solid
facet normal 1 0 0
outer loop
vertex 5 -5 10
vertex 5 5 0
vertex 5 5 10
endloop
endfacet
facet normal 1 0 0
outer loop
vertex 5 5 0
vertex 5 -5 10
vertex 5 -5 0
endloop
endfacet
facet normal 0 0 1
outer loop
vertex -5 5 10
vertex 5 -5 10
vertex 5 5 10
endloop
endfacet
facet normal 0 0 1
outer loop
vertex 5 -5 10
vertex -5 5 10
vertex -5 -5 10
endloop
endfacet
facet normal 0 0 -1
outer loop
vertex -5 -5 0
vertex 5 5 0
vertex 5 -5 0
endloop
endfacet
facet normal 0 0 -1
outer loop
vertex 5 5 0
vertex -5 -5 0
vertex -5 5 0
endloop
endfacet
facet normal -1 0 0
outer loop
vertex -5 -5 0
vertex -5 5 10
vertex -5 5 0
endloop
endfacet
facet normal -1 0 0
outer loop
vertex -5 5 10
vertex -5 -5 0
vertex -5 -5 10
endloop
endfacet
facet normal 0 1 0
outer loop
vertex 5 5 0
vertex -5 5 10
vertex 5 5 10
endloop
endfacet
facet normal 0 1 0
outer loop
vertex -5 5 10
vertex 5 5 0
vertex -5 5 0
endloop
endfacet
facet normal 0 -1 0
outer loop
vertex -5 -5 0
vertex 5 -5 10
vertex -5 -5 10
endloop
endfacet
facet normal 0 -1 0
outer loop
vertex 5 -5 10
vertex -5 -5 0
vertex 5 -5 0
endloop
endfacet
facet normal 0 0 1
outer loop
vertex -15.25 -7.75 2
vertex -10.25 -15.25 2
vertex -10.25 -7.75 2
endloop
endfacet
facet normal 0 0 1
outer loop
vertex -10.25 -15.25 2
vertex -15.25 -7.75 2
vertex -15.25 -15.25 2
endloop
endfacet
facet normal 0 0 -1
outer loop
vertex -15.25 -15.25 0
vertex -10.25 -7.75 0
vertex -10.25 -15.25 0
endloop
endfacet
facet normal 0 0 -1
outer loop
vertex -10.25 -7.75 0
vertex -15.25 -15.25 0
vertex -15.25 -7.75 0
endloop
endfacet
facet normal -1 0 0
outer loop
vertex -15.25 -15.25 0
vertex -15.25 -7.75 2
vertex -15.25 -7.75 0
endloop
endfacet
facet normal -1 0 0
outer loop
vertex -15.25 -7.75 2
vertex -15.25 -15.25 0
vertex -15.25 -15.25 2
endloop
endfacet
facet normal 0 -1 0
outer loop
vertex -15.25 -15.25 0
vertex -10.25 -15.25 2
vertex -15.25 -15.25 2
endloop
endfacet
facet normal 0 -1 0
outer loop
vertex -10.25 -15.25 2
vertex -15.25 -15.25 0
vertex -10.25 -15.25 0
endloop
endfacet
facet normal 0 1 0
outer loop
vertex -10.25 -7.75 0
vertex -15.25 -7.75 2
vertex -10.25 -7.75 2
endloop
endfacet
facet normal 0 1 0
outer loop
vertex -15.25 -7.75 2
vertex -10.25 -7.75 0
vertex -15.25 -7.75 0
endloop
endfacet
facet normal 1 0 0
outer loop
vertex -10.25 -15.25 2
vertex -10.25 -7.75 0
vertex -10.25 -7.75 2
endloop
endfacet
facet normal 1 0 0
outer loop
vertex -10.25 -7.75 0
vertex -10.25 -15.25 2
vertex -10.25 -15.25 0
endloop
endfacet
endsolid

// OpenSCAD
translate([0, 0, 5]) color([0,1,0,0.9]) cube([10, 10, 10], center=true);
translate([-15.0, -15.0, 1]) color([1,0,0]) cube([0.5, 0.5, 2], center=true);
translate([-15.0, -14.5, 1]) color([1,0,0]) cube([0.5, 0.5, 2], center=true);
translate([-15.0, -14.0, 1]) color([1,0,0]) cube([0.5, 0.5, 2], center=true);
translate([-15.0, -13.5, 1]) color([1,0,0]) cube([0.5, 0.5, 2], center=true);
translate([-15.0, -13.0, 1]) color([1,0,0]) cube([0.5, 0.5, 2], center=true);
translate([-15.0, -12.5, 1]) color([1,0,0]) cube([0.5, 0.5, 2], center=true);
translate([-15.0, -12.0, 1]) color([1,0,0]) cube([0.5, 0.5, 2], center=true);
translate([-15.0, -11.5, 1]) color([1,0,0]) cube([0.5, 0.5, 2], center=true);
translate([-15.0, -11.0, 1]) color([1,0,0]) cube([0.5, 0.5, 2], center=true);
translate([-15.0, -10.5, 1]) color([1,0,0]) cube([0.5, 0.5, 2], center=true);
translate([-15.0, -10.0, 1]) color([1,0,0]) cube([0.5, 0.5, 2], center=true);
translate([-15.0, -9.5, 1]) color([1,0,0]) cube([0.5, 0.5, 2], center=true);
translate([-15.0, -9.0, 1]) color([1,0,0]) cube([0.5, 0.5, 2], center=true);
translate([-15.0, -8.5, 1]) color([1,0,0]) cube([0.5, 0.5, 2], center=true);
translate([-15.0, -8.0, 1]) color([1,0,0]) cube([0.5, 0.5, 2], center=true);
translate([-14.5, -15.0, 1]) color([1,0,0]) cube([0.5, 0.5, 2], center=true);
translate([-14.5, -14.5, 1]) color([1,0,0]) cube([0.5, 0.5, 2], center=true);
translate([-14.5, -14.0, 1]) color([1,0,0]) cube([0.5, 0.5, 2], center=true);
translate([-14.5, -13.5, 1]) color([1,0,0]) cube([0.5, 0.5, 2], center=true);
translate([-14.5, -13.0, 1]) color([1,0,0]) cube([0.5, 0.5, 2], center=true);
translate([-14.5, -12.5, 1]) color([1,0,0]) cube([0.5, 0.5, 2], center=true);
translate([-14.5, -12.0, 1]) color([1,0,0]) cube([0.5, 0.5, 2], center=true);
translate([-14.5, -11.5, 1]) color([1,0,0]) cube([0.5, 0.5, 2], center=true);
translate([-14.5, -11.0, 1]) color([1,0,0]) cube([0.5, 0.5, 2], center=true);
translate([-14.5, -10.5, 1]) color([1,0,0]) cube([0.5, 0.5, 2], center=true);
translate([-14.5, -10.0, 1]) color([1,0,0]) cube([0.5, 0.5, 2], center=true);
translate([-14.5, -9.5, 1]) color([1,0,0]) cube([0.5, 0.5, 2], center=true);
translate([-14.5, -9.0, 1]) color([1,0,0]) cube([0.5, 0.5, 2], center=true);
translate([-14.5, -8.5, 1]) color([1,0,0]) cube([0.5, 0.5, 2], center=true);
translate([-14.5, -8.0, 1]) color([1,0,0]) cube([0.5, 0.5, 2], center=true);
translate([-14.0, -15.0, 1]) color([1,0,0]) cube([0.5, 0.5, 2], center=true);
translate([-14.0, -14.5, 1]) color([1,0,0]) cube([0.5, 0.5, 2], center=true);
translate([-14.0, -14.0, 1]) color([1,0,0]) cube([0.5, 0.5, 2], center=true);
translate([-14.0, -13.5, 1]) color([1,0,0]) cube([0.5, 0.5, 2], center=true);
translate([-14.0, -13.0, 1]) color([1,0,0]) cube([0.5, 0.5, 2], center=true);
translate([-14.0, -12.5, 1]) color([1,0,0]) cube([0.5, 0.5, 2], center=true);
translate([-14.0, -12.0, 1]) color([1,0,0]) cube([0.5, 0.5, 2], center=true);
translate([-14.0, -11.5, 1]) color([1,0,0]) cube([0.5, 0.5, 2], center=true);
translate([-14.0, -11.0, 1]) color([1,0,0]) cube([0.5, 0.5, 2], center=true);
translate([-14.0, -10.5, 1]) color([1,0,0]) cube([0.5, 0.5, 2], center=true);
translate([-14.0, -10.0, 1]) color([1,0,0]) cube([0.5, 0.5, 2], center=true);
translate([-14.0, -9.5, 1]) color([1,0,0]) cube([0.5, 0.5, 2], center=true);
translate([-14.0, -9.0, 1]) color([1,0,0]) cube([0.5, 0.5, 2], center=true);
translate([-14.0, -8.5, 1]) color([1,0,0]) cube([0.5, 0.5, 2], center=true);
translate([-14.0, -8.0, 1]) color([1,0,0]) cube([0.5, 0.5, 2], center=true);
translate([-13.5, -15.0, 1]) color([1,0,0]) cube([0.5, 0.5, 2], center=true);
translate([-13.5, -14.5, 1]) color([1,0,0]) cube([0.5, 0.5, 2], center=true);
translate([-13.5, -14.0, 1]) color([1,0,0]) cube([0.5, 0.5, 2], center=true);
translate([-13.5, -13.5, 1]) color([1,0,0]) cube([0.5, 0.5, 2], center=true);
translate([-13.5, -13.0, 1]) color([1,0,0]) cube([0.5, 0.5, 2], center=true);
translate([-13.5, -12.5, 1]) color([1,0,0]) cube([0.5, 0.5, 2], center=true);
translate([-13.5, -12.0, 1]) color([1,0,0]) cube([0.5, 0.5, 2], center=true);
translate([-13.5, -11.5, 1]) color([1,0,0]) cube([0.5, 0.5, 2], center=true);
translate([-13.5, -11.0, 1]) color([1,0,0]) cube([0.5, 0.5, 2], center=true);
translate([-13.5, -10.5, 1]) color([1,0,0]) cube([0.5, 0.5, 2], center=true);
translate([-13.5, -10.0, 1]) color([1,0,0]) cube([0.5, 0.5, 2], center=true);
translate([-13.5, -9.5, 1]) color([1,0,0]) cube([0.5, 0.5, 2], center=true);
translate([-13.5, -9.0, 1]) color([1,0,0]) cube([0.5, 0.5, 2], center=true);
translate([-13.5, -8.5, 1]) color([1,0,0]) cube([0.5, 0.5, 2], center=true);
translate([-13.5, -8.0, 1]) color([1,0,0]) cube([0.5, 0.5, 2], center=true);
translate([-13.0, -15.0, 1]) color([1,0,0]) cube([0.5, 0.5, 2], center=true);
translate([-13.0, -14.5, 1]) color([1,0,0]) cube([0.5, 0.5, 2], center=true);
translate([-13.0, -14.0, 1]) color([1,0,0]) cube([0.5, 0.5, 2], center=true);
translate([-13.0, -13.5, 1]) color([1,0,0]) cube([0.5, 0.5, 2], center=true);
translate([-13.0, -13.0, 1]) color([1,0,0]) cube([0.5, 0.5, 2], center=true);
translate([-13.0, -12.5, 1]) color([1,0,0]) cube([0.5, 0.5, 2], center=true);
translate([-13.0, -12.0, 1]) color([1,0,0]) cube([0.5, 0.5, 2], center=true);
translate([-13.0, -11.5, 1]) color([1,0,0]) cube([0.5, 0.5, 2], center=true);
translate([-13.0, -11.0, 1]) color([1,0,0]) cube([0.5, 0.5, 2], center=true);
translate([-13.0, -10.5, 1]) color([1,0,0]) cube([0.5, 0.5, 2], center=true);
translate([-13.0, -10.0, 1]) color([1,0,0]) cube([0.5, 0.5, 2], center=true);
translate([-13.0, -9.5, 1]) color([1,0,0]) cube([0.5, 0.5, 2], center=true);
translate([-13.0, -9.0, 1]) color([1,0,0]) cube([0.5, 0.5, 2], center=true);
translate([-13.0, -8.5, 1]) color([1,0,0]) cube([0.5, 0.5, 2], center=true);
translate([-13.0, -8.0, 1]) color([1,0,0]) cube([0.5, 0.5, 2], center=true);
translate([-12.5, -15.0, 1]) color([1,0,0]) cube([0.5, 0.5, 2], center=true);
translate([-12.5, -14.5, 1]) color([1,0,0]) cube([0.5, 0.5, 2], center=true);
translate([-12.5, -14.0, 1]) color([1,0,0]) cube([0.5, 0.5, 2], center=true);
translate([-12.5, -13.5, 1]) color([1,0,0]) cube([0.5, 0.5, 2], center=true);
translate([-12.5, -13.0, 1]) color([1,0,0]) cube([0.5, 0.5, 2], center=true);
translate([-12.5, -12.5, 1]) color([1,0,0]) cube([0.5, 0.5, 2], center=true);
translate([-12.5, -12.0, 1]) color([1,0,0]) cube([0.5, 0.5, 2], center=true);
translate([-12.5, -11.5, 1]) color([1,0,0]) cube([0.5, 0.5, 2], center=true);
translate([-12.5, -11.0, 1]) color([1,0,0]) cube([0.5, 0.5, 2], center=true);
translate([-12.5, -10.5, 1]) color([1,0,0]) cube([0.5, 0.5, 2], center=true);
translate([-12.5, -10.0, 1]) color([1,0,0]) cube([0.5, 0.5, 2], center=true);
translate([-12.5, -9.5, 1]) color([1,0,0]) cube([0.5, 0.5, 2], center=true);
translate([-12.5, -9.0, 1]) color([1,0,0]) cube([0.5, 0.5, 2], center=true);
translate([-12.5, -8.5, 1]) color([1,0,0]) cube([0.5, 0.5, 2], center=true);
translate([-12.5, -8.0, 1]) color([1,0,0]) cube([0.5, 0.5, 2], center=true);
translate([-12.0, -15.0, 1]) color([1,0,0]) cube([0.5, 0.5, 2], center=true);
translate([-12.0, -14.5, 1]) color([1,0,0]) cube([0.5, 0.5, 2], center=true);
translate([-12.0, -14.0, 1]) color([1,0,0]) cube([0.5, 0.5, 2], center=true);
translate([-12.0, -13.5, 1]) color([1,0,0]) cube([0.5, 0.5, 2], center=true);
translate([-12.0, -13.0, 1]) color([1,0,0]) cube([0.5, 0.5, 2], center=true);
translate([-12.0, -12.5, 1]) color([1,0,0]) cube([0.5, 0.5, 2], center=true);
translate([-12.0, -12.0, 1]) color([1,0,0]) cube([0.5, 0.5, 2], center=true);
translate([-12.0, -11.5, 1]) color([1,0,0]) cube([0.5, 0.5, 2], center=true);
translate([-12.0, -11.0, 1]) color([1,0,0]) cube([0.5, 0.5, 2], center=true);
translate([-12.0, -10.5, 1]) color([1,0,0]) cube([0.5, 0.5, 2], center=true);
translate([-12.0, -10.0, 1]) color([1,0,0]) cube([0.5, 0.5, 2], center=true);
translate([-12.0, -9.5, 1]) color([1,0,0]) cube([0.5, 0.5, 2], center=true);
translate([-12.0, -9.0, 1]) color([1,0,0]) cube([0.5, 0.5, 2], center=true);
translate([-12.0, -8.5, 1]) color([1,0,0]) cube([0.5, 0.5, 2], center=true);
translate([-12.0, -8.0, 1]) color([1,0,0]) cube([0.5, 0.5, 2], center=true);
translate([-11.5, -15.0, 1]) color([1,0,0]) cube([0.5, 0.5, 2], center=true);
translate([-11.5, -14.5, 1]) color([1,0,0]) cube([0.5, 0.5, 2], center=true);
translate([-11.5, -14.0, 1]) color([1,0,0]) cube([0.5, 0.5, 2], center=true);
translate([-11.5, -13.5, 1]) color([1,0,0]) cube([0.5, 0.5, 2], center=true);
translate([-11.5, -13.0, 1]) color([1,0,0]) cube([0.5, 0.5, 2], center=true);
translate([-11.5, -12.5, 1]) color([1,0,0]) cube([0.5, 0.5, 2], center=true);
translate([-11.5, -12.0, 1]) color([1,0,0]) cube([0.5, 0.5, 2], center=true);
translate([-11.5, -11.5, 1]) color([1,0,0]) cube([0.5, 0.5, 2], center=true);
translate([-11.5, -11.0, 1]) color([1,0,0]) cube([0.5, 0.5, 2], center=true);
translate([-11.5, -10.5, 1]) color([1,0,0]) cube([0.5, 0.5, 2], center=true);
translate([-11.5, -10.0, 1]) color([1,0,0]) cube([0.5, 0.5, 2], center=true);
translate([-11.5, -9.5, 1]) color([1,0,0]) cube([0.5, 0.5, 2], center=true);
translate([-11.5, -9.0, 1]) color([1,0,0]) cube([0.5, 0.5, 2], center=true);
translate([-11.5, -8.5, 1]) color([1,0,0]) cube([0.5, 0.5, 2], center=true);
translate([-11.5, -8.0, 1]) color([1,0,0]) cube([0.5, 0.5, 2], center=true);
translate([-11.0, -15.0, 1]) color([1,0,0]) cube([0.5, 0.5, 2], center=true);
translate([-11.0, -14.5, 1]) color([1,0,0]) cube([0.5, 0.5, 2], center=true);
translate([-11.0, -14.0, 1]) color([1,0,0]) cube([0.5, 0.5, 2], center=true);
translate([-11.0, -13.5, 1]) color([1,0,0]) cube([0.5, 0.5, 2], center=true);
translate([-11.0, -13.0, 1]) color([1,0,0]) cube([0.5, 0.5, 2], center=true);
translate([-11.0, -12.5, 1]) color([1,0,0]) cube([0.5, 0.5, 2], center=true);
translate([-11.0, -12.0, 1]) color([1,0,0]) cube([0.5, 0.5, 2], center=true);
translate([-11.0, -11.5, 1]) color([1,0,0]) cube([0.5, 0.5, 2], center=true);
translate([-11.0, -11.0, 1]) color([1,0,0]) cube([0.5, 0.5, 2], center=true);
translate([-11.0, -10.5, 1]) color([1,0,0]) cube([0.5, 0.5, 2], center=true);
translate([-11.0, -10.0, 1]) color([1,0,0]) cube([0.5, 0.5, 2], center=true);
translate([-11.0, -9.5, 1]) color([1,0,0]) cube([0.5, 0.5, 2], center=true);
translate([-11.0, -9.0, 1]) color([1,0,0]) cube([0.5, 0.5, 2], center=true);
translate([-11.0, -8.5, 1]) color([1,0,0]) cube([0.5, 0.5, 2], center=true);
translate([-11.0, -8.0, 1]) color([1,0,0]) cube([0.5, 0.5, 2], center=true);
translate([-10.5, -15.0, 1]) color([1,0,0]) cube([0.5, 0.5, 2], center=true);
translate([-10.5, -14.5, 1]) color([1,0,0]) cube([0.5, 0.5, 2], center=true);
translate([-10.5, -14.0, 1]) color([1,0,0]) cube([0.5, 0.5, 2], center=true);
translate([-10.5, -13.5, 1]) color([1,0,0]) cube([0.5, 0.5, 2], center=true);
translate([-10.5, -13.0, 1]) color([1,0,0]) cube([0.5, 0.5, 2], center=true);
translate([-10.5, -12.5, 1]) color([1,0,0]) cube([0.5, 0.5, 2], center=true);
translate([-10.5, -12.0, 1]) color([1,0,0]) cube([0.5, 0.5, 2], center=true);
translate([-10.5, -11.5, 1]) color([1,0,0]) cube([0.5, 0.5, 2], center=true);
translate([-10.5, -11.0, 1]) color([1,0,0]) cube([0.5, 0.5, 2], center=true);
translate([-10.5, -10.5, 1]) color([1,0,0]) cube([0.5, 0.5, 2], center=true);
translate([-10.5, -10.0, 1]) color([1,0,0]) cube([0.5, 0.5, 2], center=true);
translate([-10.5, -9.5, 1]) color([1,0,0]) cube([0.5, 0.5, 2], center=true);
translate([-10.5, -9.0, 1]) color([1,0,0]) cube([0.5, 0.5, 2], center=true);
translate([-10.5, -8.5, 1]) color([1,0,0]) cube([0.5, 0.5, 2], center=true);
translate([-10.5, -8.0, 1]) color([1,0,0]) cube([0.5, 0.5, 2], center=true);
